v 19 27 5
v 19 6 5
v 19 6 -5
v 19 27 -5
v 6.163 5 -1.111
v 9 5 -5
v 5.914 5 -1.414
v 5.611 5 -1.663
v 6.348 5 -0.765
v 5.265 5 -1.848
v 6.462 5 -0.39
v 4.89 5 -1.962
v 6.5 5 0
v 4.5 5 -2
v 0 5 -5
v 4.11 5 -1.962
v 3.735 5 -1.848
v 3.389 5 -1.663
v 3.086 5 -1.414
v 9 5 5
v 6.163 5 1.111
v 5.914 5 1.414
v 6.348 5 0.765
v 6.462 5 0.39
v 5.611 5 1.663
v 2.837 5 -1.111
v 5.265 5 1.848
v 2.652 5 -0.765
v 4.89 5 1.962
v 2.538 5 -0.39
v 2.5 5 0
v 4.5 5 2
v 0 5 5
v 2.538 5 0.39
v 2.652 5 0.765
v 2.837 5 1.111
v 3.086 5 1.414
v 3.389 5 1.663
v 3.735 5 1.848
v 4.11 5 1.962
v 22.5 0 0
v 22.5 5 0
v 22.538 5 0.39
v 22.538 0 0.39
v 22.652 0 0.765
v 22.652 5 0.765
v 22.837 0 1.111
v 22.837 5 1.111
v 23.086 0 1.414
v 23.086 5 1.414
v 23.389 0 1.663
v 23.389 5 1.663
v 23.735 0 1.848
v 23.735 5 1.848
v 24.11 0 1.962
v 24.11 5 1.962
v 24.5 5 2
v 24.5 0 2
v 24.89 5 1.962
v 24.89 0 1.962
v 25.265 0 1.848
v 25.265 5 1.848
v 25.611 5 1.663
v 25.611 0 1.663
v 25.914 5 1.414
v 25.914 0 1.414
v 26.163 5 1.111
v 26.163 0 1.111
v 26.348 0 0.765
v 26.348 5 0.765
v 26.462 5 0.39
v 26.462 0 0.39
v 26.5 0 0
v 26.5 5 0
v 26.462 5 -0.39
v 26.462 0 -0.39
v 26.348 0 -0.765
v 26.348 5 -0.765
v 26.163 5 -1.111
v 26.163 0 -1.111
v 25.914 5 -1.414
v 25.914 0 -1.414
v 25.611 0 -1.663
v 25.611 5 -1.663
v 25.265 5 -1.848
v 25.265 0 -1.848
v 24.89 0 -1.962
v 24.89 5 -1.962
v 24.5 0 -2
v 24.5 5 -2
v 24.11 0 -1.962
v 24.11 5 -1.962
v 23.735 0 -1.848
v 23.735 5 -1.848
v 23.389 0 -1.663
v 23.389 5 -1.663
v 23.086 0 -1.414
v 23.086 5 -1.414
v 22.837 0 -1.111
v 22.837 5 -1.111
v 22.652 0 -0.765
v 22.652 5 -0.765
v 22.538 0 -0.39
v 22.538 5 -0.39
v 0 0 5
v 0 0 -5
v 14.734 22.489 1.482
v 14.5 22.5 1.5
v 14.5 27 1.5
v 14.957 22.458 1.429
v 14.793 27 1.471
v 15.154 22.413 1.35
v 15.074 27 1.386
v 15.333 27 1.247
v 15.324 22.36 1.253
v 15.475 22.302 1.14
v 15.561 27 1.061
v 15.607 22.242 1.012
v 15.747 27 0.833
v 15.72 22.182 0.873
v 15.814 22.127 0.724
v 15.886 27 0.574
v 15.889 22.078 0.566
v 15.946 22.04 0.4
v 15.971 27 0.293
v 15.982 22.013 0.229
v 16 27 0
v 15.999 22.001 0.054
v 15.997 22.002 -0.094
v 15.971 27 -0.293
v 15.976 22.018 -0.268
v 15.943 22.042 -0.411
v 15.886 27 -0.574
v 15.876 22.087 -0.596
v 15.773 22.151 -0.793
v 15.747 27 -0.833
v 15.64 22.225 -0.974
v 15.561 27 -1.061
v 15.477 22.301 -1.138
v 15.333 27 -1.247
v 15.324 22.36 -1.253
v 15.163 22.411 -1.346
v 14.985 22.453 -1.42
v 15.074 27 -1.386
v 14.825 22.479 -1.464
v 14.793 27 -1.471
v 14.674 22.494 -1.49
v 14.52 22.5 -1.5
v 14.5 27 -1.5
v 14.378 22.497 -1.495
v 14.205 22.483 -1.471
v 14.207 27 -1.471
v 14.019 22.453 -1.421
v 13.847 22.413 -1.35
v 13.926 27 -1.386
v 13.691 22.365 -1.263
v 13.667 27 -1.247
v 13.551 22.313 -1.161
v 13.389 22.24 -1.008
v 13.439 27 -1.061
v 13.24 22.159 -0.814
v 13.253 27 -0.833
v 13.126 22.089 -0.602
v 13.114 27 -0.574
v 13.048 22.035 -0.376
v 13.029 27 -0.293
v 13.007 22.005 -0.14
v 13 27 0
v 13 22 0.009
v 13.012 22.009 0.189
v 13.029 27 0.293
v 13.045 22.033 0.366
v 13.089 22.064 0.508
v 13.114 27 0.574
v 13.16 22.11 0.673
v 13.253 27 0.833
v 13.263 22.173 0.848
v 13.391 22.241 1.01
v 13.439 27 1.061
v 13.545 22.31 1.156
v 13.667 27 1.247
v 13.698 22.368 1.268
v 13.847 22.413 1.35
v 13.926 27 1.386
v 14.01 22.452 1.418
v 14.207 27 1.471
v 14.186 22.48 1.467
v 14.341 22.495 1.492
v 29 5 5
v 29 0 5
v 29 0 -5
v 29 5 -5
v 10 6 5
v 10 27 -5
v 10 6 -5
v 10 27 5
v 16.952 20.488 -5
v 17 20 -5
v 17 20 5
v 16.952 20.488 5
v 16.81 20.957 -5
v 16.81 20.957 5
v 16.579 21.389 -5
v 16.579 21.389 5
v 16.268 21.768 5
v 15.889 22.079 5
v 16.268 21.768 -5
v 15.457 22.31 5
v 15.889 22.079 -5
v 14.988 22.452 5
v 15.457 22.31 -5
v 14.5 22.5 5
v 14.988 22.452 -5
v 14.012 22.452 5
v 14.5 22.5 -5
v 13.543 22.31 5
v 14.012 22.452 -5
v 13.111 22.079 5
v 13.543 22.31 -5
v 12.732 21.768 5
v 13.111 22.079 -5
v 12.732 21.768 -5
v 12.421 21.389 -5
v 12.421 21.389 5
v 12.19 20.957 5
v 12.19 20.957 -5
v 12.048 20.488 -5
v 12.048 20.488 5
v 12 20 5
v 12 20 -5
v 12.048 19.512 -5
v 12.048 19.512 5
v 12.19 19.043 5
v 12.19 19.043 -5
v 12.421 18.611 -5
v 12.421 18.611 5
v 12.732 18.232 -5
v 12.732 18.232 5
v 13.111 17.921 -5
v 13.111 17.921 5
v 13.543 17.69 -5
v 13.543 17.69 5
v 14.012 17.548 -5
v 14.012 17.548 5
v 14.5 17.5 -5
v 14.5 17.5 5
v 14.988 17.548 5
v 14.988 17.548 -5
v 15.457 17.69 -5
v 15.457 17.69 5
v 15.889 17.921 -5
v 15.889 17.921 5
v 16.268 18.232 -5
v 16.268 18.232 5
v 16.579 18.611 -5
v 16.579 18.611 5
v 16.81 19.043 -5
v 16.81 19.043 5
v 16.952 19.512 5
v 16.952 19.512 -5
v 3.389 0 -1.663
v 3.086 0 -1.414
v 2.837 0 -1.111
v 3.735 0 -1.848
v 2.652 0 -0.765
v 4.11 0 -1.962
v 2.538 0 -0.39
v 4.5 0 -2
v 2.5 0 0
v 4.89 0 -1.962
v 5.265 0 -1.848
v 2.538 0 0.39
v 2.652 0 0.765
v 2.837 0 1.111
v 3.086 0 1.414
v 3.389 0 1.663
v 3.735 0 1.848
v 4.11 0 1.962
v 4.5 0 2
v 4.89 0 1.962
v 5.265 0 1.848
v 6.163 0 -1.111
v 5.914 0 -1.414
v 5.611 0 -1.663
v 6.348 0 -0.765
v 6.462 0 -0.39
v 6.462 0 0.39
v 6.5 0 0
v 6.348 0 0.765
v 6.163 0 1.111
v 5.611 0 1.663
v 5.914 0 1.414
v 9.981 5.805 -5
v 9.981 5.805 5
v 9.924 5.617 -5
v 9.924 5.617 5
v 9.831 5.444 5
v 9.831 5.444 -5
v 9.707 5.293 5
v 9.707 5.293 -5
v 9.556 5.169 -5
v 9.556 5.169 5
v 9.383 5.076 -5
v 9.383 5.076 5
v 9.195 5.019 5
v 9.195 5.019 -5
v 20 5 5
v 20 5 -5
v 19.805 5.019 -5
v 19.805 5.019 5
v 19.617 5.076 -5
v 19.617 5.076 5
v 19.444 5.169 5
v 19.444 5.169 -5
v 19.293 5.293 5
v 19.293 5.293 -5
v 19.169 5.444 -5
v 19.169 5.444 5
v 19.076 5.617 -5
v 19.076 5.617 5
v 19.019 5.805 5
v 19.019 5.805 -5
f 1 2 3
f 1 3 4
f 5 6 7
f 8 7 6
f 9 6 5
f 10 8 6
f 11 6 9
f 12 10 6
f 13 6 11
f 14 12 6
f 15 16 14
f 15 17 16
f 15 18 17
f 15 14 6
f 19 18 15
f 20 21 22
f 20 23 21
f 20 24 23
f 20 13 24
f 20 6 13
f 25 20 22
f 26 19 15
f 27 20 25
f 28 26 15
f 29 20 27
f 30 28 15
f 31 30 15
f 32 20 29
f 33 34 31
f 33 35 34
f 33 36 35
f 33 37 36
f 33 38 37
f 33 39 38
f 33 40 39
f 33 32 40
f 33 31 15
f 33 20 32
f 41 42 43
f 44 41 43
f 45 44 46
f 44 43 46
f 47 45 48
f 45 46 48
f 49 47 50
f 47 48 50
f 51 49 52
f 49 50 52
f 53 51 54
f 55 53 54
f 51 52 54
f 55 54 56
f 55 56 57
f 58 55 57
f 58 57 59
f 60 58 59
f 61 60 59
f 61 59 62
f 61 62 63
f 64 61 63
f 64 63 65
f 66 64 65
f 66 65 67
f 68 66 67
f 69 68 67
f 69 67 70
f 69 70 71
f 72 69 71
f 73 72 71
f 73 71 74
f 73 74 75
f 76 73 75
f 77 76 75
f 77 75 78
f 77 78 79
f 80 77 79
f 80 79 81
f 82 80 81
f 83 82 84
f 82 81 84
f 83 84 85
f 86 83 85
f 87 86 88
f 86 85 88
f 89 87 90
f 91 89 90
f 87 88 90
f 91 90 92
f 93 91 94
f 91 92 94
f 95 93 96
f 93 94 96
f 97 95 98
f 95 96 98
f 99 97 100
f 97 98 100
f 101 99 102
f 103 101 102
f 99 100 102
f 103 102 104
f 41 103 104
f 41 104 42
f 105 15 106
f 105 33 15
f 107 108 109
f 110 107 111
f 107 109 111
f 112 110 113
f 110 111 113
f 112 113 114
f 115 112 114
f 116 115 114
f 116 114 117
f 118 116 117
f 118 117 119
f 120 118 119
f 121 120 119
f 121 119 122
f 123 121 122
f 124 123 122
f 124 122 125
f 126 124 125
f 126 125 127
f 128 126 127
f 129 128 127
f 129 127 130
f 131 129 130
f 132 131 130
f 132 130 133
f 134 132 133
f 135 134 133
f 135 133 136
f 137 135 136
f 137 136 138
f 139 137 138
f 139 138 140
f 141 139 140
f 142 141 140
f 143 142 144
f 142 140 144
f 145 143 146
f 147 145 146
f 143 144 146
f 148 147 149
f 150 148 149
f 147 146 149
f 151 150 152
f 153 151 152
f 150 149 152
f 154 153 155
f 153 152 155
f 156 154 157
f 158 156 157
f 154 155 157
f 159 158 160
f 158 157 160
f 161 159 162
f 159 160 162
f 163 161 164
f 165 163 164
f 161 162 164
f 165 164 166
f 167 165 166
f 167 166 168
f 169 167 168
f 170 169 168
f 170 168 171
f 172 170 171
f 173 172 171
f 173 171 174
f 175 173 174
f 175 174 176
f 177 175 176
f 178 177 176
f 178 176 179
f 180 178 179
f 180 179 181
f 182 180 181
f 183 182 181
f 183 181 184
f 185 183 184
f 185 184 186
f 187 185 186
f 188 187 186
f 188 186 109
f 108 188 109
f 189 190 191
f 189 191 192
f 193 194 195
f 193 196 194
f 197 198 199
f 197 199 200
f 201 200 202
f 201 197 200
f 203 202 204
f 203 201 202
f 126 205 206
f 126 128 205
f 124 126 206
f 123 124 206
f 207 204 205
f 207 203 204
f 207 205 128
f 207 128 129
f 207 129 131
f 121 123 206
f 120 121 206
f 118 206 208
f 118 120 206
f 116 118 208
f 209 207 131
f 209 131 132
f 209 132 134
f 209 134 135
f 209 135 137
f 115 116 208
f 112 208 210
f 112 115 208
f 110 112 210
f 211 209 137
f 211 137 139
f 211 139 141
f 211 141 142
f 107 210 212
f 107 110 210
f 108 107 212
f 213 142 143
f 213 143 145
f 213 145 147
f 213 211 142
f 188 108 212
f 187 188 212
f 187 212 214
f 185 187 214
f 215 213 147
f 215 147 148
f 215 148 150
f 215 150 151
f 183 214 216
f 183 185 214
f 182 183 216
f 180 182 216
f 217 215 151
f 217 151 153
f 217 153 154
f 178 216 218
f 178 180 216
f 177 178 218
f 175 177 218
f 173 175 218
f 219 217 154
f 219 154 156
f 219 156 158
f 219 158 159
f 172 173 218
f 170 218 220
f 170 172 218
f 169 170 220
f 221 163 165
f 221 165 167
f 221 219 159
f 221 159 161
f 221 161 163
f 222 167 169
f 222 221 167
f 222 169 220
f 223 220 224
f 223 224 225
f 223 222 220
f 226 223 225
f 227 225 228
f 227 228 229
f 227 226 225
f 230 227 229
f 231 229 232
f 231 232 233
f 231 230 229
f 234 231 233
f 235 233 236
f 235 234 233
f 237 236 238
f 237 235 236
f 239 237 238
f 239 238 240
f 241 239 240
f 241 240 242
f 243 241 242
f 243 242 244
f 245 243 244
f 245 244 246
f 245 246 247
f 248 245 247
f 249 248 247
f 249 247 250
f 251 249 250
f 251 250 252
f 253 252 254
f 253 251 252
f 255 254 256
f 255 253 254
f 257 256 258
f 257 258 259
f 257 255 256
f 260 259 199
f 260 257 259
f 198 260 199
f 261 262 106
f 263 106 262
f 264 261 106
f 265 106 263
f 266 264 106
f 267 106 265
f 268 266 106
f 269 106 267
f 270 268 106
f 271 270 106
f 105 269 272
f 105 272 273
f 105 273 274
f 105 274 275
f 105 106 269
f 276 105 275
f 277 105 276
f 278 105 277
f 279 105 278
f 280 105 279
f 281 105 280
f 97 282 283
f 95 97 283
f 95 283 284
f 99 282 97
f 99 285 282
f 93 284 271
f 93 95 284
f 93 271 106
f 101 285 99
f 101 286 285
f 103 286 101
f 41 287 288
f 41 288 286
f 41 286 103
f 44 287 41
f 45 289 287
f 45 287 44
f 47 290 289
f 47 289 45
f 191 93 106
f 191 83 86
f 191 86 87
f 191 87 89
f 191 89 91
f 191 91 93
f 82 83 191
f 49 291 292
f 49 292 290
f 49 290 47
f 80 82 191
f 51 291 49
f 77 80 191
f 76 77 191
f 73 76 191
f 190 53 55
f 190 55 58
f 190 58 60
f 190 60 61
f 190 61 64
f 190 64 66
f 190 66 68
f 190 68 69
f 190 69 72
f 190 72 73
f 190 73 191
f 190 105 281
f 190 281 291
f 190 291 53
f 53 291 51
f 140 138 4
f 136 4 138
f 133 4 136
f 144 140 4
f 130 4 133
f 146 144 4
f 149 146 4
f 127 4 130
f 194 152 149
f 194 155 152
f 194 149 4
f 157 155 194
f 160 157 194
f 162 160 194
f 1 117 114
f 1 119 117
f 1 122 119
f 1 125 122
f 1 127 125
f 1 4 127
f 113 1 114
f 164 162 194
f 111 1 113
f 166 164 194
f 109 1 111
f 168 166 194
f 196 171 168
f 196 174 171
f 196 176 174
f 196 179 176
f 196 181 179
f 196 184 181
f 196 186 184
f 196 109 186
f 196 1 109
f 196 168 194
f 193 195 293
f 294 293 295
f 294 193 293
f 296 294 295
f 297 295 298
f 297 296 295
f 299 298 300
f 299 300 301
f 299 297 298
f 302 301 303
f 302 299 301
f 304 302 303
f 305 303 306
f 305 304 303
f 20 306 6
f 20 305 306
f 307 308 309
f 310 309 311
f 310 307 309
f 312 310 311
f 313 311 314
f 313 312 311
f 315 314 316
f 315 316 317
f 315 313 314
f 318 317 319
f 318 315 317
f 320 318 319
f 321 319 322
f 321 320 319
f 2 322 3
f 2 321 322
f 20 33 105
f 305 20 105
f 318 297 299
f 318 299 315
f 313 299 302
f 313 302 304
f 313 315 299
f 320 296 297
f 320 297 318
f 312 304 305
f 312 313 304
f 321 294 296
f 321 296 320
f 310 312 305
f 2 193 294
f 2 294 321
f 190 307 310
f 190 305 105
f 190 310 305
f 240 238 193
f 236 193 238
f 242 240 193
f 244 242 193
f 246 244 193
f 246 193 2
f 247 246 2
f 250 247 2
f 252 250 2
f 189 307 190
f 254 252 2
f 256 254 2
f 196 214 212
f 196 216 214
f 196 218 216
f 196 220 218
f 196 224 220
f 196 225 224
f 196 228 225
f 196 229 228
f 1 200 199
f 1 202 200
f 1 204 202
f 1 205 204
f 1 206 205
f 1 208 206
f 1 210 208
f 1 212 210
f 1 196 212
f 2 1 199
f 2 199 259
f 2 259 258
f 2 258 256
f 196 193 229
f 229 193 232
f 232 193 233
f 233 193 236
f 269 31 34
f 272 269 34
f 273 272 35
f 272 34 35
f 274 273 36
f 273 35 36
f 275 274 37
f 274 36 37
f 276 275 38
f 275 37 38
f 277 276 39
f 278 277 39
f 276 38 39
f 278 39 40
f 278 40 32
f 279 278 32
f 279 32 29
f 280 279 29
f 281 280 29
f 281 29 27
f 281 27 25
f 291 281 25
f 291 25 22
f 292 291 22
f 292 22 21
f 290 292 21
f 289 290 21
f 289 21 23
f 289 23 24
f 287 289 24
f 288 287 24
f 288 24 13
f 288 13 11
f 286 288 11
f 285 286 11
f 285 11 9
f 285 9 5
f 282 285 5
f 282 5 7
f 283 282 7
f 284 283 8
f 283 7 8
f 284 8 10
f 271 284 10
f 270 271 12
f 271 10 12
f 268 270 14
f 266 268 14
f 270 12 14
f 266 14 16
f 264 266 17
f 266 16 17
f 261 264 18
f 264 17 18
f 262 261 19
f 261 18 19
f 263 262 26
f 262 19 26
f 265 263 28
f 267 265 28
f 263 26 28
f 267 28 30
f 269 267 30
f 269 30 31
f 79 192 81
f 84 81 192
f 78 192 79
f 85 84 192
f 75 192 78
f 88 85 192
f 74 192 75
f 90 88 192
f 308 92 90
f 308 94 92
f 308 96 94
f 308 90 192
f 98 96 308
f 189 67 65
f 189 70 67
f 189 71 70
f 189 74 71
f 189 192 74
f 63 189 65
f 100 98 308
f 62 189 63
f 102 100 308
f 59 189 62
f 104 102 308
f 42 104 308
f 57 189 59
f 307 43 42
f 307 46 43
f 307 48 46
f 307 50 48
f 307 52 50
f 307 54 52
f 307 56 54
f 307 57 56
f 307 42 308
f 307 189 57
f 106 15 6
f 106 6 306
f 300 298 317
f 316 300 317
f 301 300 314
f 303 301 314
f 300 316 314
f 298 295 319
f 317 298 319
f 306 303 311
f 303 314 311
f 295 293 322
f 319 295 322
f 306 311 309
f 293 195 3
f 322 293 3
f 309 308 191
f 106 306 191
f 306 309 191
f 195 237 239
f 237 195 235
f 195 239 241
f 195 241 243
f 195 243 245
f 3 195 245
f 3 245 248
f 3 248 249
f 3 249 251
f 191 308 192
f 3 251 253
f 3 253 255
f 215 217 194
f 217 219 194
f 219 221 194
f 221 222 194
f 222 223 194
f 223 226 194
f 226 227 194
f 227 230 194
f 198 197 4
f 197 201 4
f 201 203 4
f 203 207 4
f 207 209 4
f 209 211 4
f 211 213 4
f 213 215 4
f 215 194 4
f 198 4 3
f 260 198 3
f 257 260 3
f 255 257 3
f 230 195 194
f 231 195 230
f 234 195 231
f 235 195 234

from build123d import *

# Parameters (mm, degrees)
SKETCH1_R               = 2.5
BOSS_EXTRUDE1_DEPTH     = 5
CUT_EXTRUDE1_REACH      = 41.937
CUT_EXTRUDE1_END_RADIUS = 2.5
SKETCH2_R               = 1.5
SKETCH3_R               = 2
CUT_EXTRUDE2_DEPTH      = 37.742346215


with BuildPart() as part:
    # Sketch1 → Boss-Extrude1 (new, symmetric)
    with BuildSketch(Plane.XY):
        with BuildLine():
            Line((0, 0), (29, 0))
            Line((29, 0), (29, 5))
            Line((29, 5), (20, 5))
            ThreePointArc((20, 5), (19.292893219, 5.292893219), (19, 6))
            Line((19, 6), (19, 27))
            Line((19, 27), (10, 27))
            Line((10, 27), (10, 6))
            ThreePointArc((10, 6), (9.707106781, 5.292893219), (9, 5))
            Line((9, 5), (0, 5))
            Line((0, 5), (0, 0))
        make_face()
        with Locations((14.5, 20)):
            Circle(SKETCH1_R, mode=Mode.SUBTRACT)
    extrude(amount=BOSS_EXTRUDE1_DEPTH, both=True)

    # Cut-Extrude1: up to this cylinder (the profile starts outside it)
    cut_extrude1_end = Plane(origin=(14.5, 20, 0), z_dir=(0, 0, -1)) * Cylinder(CUT_EXTRUDE1_END_RADIUS, 89.874, mode=Mode.PRIVATE)
    # Sketch2 → Cut-Extrude1 (cut, up to the surface)
    with BuildSketch(Plane(origin=(0, 27, 0), x_dir=(1, 0, 0), z_dir=(0, 1, 0)), mode=Mode.PRIVATE) as cut_extrude1_sk1:
        with Locations(Location((14.5, 0, 0), (0, 0, 270))):
            Circle(SKETCH2_R)
    cut_extrude1_tool1 = extrude(cut_extrude1_sk1.sketch, amount=-CUT_EXTRUDE1_REACH, mode=Mode.PRIVATE) - cut_extrude1_end
    add(cut_extrude1_tool1.solids().sort_by_distance((14.5, 27, 0))[0], mode=Mode.SUBTRACT)

    # Sketch3 → Cut-Extrude2 (cut, through all)
    with BuildSketch(Plane(origin=(0, 5, 0), x_dir=(1, 0, 0), z_dir=(0, 1, 0))):
        with Locations(Location((4.5, 0, 0), (0, 0, 180))):
            Circle(SKETCH3_R)
        with Locations(Location((24.5, 0, 0), (0, 0, 180))):
            Circle(SKETCH3_R)
    extrude(amount=-CUT_EXTRUDE2_DEPTH, mode=Mode.SUBTRACT)


solid = part.part
